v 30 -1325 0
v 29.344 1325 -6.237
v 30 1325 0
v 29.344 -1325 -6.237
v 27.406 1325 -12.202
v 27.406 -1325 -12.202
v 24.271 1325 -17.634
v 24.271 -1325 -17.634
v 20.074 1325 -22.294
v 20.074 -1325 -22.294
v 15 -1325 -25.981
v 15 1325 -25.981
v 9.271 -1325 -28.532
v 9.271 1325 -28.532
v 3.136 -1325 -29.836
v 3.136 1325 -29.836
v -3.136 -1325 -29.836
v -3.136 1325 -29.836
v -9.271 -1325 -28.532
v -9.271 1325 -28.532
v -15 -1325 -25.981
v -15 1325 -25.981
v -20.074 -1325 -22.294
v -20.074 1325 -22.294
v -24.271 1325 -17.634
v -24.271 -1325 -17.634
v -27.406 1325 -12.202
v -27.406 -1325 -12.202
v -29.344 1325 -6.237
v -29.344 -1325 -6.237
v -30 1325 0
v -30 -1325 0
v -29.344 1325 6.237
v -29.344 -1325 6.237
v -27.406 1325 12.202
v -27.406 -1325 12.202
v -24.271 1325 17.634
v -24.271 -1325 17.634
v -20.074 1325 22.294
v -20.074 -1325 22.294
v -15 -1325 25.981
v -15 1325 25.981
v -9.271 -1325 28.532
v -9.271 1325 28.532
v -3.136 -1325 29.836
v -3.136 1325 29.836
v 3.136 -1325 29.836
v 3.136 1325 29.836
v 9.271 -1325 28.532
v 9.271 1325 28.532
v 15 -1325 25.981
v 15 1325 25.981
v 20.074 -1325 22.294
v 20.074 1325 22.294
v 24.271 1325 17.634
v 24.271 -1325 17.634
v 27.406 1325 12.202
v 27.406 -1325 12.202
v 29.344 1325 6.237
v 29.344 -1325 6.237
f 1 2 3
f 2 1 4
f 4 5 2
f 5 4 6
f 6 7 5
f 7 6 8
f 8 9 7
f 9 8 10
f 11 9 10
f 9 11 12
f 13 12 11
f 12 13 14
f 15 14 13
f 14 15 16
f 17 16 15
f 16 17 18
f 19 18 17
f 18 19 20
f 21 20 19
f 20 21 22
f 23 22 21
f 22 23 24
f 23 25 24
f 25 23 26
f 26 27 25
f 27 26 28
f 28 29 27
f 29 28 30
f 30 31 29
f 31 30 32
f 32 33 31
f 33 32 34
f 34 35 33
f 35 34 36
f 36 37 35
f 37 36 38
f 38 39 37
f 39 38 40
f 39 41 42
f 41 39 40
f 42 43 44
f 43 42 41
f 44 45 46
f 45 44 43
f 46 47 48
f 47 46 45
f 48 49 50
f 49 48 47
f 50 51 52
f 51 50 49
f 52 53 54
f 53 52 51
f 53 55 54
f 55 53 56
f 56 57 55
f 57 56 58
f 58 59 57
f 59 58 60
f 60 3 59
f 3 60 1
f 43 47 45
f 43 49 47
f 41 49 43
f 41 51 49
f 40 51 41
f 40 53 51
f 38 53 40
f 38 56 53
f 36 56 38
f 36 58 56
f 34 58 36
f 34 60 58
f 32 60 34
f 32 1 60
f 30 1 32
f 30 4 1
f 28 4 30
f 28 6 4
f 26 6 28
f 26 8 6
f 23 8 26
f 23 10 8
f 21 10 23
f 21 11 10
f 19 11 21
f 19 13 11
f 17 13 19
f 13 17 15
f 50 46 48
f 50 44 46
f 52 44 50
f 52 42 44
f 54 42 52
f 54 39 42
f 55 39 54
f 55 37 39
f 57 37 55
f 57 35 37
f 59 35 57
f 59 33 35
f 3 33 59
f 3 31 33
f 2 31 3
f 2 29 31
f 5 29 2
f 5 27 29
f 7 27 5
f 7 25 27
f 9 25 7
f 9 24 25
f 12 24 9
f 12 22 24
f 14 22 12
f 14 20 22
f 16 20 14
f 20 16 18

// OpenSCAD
diamVnesh=60;
lenTotal=2650;


module Balka35Min() {

    rotate([-90,0,0]) 
    cylinder(h=lenTotal, r=diamVnesh/2, center=true);

}

Balka35Min();
